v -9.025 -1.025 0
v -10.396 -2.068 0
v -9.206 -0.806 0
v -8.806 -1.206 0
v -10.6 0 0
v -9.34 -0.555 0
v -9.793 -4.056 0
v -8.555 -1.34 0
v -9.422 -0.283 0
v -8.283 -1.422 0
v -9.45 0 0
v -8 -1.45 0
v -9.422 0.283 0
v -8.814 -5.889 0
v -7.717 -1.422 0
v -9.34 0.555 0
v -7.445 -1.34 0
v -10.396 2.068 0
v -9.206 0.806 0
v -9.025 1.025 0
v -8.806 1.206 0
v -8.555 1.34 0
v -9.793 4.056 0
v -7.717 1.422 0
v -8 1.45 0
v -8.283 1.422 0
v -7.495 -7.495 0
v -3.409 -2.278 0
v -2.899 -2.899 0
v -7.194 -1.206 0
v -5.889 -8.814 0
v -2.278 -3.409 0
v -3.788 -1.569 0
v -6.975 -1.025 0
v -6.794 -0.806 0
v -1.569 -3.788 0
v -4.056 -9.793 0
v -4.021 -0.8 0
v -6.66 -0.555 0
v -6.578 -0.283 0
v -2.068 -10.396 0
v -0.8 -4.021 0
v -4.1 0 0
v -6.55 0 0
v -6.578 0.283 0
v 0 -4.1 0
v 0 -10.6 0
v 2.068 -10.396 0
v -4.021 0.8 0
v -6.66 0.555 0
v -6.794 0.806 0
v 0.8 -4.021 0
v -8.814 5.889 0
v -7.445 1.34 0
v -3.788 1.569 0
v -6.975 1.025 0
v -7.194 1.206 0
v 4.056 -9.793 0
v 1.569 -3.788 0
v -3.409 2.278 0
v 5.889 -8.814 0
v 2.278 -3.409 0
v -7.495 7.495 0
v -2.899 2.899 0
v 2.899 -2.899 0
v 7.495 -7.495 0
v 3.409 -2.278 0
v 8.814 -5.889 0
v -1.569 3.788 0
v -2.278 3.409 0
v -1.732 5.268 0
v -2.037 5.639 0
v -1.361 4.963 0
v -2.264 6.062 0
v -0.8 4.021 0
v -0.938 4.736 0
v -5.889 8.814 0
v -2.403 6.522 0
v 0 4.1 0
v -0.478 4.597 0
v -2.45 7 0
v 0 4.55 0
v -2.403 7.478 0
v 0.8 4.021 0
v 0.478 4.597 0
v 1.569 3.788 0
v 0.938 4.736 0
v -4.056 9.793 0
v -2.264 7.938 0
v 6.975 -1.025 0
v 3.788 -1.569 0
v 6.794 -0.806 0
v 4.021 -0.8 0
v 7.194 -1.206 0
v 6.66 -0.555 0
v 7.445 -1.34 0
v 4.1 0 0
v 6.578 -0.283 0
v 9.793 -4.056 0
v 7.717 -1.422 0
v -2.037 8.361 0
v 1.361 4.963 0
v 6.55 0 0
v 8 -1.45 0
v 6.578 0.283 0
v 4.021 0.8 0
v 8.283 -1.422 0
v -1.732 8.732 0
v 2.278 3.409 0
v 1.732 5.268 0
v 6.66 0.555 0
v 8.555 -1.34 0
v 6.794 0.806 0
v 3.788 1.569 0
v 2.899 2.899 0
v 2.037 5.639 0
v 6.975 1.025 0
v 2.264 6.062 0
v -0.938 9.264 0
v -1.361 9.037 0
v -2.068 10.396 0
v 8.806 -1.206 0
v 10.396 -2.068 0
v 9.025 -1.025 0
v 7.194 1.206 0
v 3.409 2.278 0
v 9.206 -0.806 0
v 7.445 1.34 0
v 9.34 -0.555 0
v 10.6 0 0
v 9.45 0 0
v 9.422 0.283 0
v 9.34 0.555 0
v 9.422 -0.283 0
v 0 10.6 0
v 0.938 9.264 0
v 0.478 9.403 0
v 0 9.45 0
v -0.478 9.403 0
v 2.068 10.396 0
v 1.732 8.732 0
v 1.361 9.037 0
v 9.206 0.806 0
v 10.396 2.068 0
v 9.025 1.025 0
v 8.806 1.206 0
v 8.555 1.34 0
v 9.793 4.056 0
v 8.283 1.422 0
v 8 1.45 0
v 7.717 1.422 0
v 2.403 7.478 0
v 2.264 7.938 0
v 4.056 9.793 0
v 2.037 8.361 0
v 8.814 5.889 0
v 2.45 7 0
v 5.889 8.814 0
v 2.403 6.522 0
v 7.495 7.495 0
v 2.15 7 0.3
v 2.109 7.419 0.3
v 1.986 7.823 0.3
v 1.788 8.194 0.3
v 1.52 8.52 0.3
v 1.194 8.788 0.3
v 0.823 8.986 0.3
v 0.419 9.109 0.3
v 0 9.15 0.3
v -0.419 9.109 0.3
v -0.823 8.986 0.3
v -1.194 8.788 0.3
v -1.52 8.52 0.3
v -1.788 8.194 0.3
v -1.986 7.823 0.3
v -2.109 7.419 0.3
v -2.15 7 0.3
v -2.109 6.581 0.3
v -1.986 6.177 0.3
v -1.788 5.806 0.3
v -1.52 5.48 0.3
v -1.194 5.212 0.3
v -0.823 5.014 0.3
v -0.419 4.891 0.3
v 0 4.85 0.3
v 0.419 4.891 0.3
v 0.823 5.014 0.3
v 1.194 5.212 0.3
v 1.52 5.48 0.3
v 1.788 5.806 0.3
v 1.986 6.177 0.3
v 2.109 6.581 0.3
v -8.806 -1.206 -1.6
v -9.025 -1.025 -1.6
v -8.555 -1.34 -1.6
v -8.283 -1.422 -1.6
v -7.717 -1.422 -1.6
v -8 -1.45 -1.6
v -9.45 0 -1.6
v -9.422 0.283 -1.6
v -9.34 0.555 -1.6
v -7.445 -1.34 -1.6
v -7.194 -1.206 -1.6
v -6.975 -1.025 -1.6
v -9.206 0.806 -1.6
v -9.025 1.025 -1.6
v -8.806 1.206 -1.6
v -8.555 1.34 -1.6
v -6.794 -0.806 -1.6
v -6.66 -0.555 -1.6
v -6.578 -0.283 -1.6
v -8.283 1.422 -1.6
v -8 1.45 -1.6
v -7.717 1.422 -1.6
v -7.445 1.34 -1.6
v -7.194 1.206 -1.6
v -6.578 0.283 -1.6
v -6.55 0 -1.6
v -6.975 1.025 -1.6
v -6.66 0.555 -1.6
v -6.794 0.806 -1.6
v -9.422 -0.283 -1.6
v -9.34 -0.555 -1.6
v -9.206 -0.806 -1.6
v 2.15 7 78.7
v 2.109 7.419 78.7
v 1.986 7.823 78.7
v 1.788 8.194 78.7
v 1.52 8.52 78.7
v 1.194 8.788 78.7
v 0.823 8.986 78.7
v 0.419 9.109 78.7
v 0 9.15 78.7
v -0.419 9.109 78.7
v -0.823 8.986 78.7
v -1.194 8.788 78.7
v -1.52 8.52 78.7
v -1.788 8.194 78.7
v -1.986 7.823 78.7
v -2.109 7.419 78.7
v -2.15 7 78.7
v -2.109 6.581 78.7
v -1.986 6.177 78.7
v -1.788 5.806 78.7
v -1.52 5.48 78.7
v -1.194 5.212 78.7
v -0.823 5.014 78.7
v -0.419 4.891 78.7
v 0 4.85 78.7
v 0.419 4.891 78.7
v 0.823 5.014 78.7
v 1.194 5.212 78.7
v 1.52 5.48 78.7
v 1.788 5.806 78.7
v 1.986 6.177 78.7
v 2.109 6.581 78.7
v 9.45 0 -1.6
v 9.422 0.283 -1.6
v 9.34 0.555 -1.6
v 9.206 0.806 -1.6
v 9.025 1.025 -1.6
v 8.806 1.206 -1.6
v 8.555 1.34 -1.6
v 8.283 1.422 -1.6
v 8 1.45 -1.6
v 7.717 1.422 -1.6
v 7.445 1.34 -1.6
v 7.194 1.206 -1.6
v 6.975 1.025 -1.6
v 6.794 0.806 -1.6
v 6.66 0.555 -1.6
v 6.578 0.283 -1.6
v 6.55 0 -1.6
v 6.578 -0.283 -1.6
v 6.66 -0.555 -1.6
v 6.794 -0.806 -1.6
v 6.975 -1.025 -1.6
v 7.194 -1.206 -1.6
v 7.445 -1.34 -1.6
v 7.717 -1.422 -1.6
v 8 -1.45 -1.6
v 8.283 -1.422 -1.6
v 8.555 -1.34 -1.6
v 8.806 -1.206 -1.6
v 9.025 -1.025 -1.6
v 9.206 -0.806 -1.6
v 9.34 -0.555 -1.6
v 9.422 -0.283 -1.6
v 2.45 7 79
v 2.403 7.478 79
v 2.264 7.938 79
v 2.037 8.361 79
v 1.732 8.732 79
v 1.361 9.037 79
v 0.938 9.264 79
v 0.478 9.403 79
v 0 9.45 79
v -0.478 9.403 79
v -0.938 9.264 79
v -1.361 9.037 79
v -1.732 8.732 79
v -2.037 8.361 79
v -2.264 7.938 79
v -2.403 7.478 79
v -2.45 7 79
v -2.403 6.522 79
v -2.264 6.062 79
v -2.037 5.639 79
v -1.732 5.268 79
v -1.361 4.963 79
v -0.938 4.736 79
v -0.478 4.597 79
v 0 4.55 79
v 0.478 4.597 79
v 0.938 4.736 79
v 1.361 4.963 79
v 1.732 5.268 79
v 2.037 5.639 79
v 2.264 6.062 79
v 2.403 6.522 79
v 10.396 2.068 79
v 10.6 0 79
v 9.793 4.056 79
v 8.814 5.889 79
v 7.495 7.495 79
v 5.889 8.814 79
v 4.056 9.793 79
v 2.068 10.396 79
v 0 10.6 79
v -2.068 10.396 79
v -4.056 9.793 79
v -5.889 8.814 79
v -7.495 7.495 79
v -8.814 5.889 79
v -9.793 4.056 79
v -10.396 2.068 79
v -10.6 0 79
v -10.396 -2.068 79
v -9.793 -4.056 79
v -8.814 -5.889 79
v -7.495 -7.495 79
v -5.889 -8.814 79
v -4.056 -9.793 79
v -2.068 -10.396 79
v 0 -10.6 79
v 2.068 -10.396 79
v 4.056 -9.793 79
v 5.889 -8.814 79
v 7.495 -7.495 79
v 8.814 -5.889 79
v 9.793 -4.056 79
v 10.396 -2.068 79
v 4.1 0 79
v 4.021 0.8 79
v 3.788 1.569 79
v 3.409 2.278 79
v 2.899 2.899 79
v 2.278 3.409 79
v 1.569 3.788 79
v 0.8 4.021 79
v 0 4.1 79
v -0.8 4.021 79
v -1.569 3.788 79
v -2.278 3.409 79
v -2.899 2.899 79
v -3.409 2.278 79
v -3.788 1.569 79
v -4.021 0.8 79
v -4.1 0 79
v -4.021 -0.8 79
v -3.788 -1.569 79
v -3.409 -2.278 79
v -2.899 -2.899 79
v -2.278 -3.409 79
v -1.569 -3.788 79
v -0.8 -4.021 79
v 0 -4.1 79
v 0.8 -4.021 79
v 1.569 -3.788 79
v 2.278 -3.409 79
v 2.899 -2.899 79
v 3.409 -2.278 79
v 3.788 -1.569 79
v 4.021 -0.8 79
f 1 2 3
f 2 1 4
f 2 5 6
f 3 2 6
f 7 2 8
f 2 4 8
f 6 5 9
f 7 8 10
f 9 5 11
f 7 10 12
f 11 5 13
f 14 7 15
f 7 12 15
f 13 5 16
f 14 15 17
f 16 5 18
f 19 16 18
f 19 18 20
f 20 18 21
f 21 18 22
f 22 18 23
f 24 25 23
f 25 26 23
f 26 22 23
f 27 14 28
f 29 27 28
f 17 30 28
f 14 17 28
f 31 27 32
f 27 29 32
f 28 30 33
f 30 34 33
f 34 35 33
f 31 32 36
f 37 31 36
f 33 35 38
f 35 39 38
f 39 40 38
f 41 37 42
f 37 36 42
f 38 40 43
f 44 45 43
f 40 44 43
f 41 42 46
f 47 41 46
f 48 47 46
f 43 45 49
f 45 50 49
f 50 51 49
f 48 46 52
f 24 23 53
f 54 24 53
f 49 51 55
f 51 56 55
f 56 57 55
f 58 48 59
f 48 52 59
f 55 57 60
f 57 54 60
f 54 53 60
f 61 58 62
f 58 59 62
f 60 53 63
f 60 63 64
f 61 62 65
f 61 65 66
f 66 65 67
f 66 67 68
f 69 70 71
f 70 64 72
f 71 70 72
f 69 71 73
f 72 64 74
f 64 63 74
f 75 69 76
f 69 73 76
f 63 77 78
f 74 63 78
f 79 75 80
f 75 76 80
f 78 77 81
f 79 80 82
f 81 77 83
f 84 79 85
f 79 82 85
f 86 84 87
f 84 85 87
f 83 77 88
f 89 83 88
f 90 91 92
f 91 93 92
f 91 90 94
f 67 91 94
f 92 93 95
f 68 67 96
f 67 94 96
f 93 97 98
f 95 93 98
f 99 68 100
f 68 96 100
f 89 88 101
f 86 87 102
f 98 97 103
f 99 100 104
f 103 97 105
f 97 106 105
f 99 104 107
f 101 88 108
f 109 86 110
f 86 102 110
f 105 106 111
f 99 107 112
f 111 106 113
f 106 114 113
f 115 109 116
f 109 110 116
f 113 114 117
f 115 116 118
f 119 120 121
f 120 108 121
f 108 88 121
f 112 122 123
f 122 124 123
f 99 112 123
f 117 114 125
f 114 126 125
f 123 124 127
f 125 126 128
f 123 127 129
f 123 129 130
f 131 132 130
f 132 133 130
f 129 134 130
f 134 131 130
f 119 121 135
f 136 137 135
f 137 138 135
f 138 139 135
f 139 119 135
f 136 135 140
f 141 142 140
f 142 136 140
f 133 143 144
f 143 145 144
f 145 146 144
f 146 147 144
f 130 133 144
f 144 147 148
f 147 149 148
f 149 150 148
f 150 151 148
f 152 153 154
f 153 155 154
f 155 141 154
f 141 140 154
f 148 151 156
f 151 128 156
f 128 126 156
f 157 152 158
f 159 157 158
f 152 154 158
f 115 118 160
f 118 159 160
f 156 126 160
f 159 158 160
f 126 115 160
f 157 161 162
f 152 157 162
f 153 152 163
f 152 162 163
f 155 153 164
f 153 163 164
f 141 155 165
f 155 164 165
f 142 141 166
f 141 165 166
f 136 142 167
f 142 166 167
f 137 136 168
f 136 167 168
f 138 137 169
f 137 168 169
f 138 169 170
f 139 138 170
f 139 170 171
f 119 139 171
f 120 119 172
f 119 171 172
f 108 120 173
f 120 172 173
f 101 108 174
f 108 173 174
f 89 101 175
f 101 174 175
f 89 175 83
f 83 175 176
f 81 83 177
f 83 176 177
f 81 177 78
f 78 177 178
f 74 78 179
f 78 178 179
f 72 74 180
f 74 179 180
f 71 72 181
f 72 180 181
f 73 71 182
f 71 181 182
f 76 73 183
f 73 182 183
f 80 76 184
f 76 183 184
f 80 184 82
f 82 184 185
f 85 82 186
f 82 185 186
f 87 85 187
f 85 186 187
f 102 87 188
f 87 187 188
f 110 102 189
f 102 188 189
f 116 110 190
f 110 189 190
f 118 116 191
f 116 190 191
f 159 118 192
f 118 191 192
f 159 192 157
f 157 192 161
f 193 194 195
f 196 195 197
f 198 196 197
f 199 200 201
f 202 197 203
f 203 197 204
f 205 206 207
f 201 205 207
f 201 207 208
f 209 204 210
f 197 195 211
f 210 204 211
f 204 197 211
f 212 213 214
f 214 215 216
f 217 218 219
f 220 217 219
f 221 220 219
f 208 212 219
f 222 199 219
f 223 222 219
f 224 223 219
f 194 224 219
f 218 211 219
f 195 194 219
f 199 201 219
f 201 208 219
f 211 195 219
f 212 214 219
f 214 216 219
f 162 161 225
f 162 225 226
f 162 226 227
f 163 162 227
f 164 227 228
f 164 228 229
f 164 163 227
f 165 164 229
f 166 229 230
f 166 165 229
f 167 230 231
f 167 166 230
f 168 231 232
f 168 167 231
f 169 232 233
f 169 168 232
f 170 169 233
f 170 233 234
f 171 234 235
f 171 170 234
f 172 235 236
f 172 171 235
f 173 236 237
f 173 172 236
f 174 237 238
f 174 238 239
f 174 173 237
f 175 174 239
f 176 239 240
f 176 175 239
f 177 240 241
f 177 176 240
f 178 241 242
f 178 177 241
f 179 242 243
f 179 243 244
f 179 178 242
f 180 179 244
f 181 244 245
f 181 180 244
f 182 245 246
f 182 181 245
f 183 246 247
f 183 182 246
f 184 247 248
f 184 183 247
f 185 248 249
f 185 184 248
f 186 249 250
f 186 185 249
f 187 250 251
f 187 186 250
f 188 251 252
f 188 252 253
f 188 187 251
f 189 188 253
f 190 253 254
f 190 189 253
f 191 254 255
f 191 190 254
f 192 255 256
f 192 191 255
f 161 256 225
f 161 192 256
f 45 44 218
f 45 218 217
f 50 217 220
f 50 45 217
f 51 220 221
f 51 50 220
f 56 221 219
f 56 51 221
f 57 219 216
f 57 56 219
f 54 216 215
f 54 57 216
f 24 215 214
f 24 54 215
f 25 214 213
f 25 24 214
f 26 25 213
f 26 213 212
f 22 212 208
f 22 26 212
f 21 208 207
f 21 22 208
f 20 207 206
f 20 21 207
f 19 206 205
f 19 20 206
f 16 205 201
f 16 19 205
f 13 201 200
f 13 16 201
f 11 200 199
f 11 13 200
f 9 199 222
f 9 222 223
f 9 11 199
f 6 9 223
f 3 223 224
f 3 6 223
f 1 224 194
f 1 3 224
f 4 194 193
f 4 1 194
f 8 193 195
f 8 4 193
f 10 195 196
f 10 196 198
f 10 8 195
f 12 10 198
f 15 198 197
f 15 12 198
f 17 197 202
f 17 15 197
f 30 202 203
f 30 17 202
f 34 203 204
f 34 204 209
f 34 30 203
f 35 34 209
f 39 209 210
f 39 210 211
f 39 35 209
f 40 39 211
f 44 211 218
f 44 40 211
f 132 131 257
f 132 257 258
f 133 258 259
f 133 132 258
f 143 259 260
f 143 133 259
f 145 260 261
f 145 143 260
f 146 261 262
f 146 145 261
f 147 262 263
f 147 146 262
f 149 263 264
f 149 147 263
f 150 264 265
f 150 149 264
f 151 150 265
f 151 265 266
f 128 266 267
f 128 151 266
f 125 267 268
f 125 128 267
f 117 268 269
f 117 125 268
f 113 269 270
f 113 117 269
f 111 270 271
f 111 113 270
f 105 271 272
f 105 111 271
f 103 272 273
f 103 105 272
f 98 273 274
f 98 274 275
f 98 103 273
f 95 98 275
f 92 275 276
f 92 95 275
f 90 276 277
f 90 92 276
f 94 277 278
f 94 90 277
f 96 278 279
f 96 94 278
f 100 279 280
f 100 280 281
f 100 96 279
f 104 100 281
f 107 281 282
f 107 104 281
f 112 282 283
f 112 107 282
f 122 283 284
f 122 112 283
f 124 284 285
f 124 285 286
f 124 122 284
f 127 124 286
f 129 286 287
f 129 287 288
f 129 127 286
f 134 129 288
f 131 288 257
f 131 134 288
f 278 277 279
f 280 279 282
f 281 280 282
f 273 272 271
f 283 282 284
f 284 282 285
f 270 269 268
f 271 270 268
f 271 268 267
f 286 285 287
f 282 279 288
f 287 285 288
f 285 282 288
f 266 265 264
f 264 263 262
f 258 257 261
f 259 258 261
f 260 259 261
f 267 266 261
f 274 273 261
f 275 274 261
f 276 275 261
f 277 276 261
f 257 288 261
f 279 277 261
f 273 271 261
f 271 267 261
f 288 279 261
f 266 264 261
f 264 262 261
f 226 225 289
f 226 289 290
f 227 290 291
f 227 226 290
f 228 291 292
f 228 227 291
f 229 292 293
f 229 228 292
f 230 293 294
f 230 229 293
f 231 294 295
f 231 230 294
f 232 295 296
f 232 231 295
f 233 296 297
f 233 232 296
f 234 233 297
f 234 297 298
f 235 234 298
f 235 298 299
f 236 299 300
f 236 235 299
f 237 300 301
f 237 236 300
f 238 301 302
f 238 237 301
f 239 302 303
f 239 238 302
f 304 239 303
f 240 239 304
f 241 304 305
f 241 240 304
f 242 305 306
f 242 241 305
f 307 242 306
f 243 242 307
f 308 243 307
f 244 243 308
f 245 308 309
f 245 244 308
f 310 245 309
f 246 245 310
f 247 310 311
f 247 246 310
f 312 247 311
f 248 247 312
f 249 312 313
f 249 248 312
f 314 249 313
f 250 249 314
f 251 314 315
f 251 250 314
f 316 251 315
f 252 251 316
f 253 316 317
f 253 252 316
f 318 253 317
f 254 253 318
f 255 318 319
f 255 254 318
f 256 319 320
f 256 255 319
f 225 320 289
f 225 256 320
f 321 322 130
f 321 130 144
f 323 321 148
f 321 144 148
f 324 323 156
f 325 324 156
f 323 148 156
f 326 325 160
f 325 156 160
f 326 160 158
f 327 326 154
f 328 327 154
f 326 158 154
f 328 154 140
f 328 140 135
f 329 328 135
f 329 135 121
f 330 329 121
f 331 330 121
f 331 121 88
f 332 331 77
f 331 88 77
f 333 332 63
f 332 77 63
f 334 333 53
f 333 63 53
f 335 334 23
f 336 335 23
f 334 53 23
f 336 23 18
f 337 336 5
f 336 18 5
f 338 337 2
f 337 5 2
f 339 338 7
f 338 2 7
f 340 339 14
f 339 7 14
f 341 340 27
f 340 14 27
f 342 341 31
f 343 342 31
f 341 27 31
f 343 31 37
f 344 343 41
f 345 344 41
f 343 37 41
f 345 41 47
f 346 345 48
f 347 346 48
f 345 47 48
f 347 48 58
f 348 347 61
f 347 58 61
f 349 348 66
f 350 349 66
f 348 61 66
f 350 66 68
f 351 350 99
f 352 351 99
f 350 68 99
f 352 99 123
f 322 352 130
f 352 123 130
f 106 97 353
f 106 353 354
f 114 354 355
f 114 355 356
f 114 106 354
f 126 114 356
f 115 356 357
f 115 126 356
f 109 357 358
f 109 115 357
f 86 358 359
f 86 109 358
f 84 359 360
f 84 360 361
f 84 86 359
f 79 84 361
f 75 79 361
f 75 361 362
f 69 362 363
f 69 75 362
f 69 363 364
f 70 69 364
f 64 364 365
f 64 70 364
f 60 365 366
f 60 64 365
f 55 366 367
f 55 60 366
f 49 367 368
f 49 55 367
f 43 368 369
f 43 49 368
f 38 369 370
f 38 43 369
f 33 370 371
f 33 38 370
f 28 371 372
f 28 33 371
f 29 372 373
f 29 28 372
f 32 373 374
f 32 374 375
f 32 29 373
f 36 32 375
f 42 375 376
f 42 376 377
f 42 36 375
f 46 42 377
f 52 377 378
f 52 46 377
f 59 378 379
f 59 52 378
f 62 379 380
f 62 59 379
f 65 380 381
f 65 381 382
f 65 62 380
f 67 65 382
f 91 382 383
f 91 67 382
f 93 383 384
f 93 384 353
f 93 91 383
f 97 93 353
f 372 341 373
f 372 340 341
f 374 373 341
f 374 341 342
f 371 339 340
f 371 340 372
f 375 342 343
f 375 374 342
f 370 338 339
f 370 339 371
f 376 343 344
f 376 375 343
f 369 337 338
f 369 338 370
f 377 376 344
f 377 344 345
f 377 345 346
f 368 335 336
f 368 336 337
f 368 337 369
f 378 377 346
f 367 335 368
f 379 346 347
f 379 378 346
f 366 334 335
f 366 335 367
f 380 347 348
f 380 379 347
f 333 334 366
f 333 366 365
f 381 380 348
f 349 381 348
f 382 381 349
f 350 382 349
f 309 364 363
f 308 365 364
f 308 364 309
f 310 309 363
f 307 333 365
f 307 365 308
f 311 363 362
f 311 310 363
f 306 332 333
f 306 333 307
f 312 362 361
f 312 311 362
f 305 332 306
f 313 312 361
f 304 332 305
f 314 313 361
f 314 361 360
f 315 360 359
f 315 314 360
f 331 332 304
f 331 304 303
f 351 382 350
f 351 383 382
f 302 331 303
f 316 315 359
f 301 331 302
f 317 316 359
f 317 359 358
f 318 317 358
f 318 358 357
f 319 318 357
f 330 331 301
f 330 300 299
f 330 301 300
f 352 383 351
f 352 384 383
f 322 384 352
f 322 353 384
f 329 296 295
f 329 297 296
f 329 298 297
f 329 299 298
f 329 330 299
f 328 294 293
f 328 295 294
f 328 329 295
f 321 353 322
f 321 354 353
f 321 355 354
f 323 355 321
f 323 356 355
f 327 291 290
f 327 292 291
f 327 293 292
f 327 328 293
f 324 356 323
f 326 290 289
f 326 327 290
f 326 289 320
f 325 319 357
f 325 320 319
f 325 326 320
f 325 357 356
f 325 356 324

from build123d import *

# Parameters (mm, degrees)
SKETCH_1_R      = 10.6
SKETCH_1_R_2    = 2.15
SKETCH_1_R_3    = 4.1
EXTRUDE_1_DEPTH = 79
SKETCH_2_R      = 1.45
EXTRUDE_2_DEPTH = 1.6
CHAMFER_1_SIZE  = 0.3


with BuildPart() as part:
    # 草图1 → 凸台-拉伸1 (new body)
    with BuildSketch(Plane.XY):
        Circle(SKETCH_1_R)
        with Locations((0, 7)):
            Circle(SKETCH_1_R_2, mode=Mode.SUBTRACT)
        Circle(SKETCH_1_R_3, mode=Mode.SUBTRACT)
    extrude(amount=EXTRUDE_1_DEPTH)

    # 草图2 → 凸台-拉伸2 (add)
    with BuildSketch(Plane.XY):
        with Locations((-8, 0)):
            Circle(SKETCH_2_R)
        with Locations((8, 0)):
            Circle(SKETCH_2_R)
    extrude(amount=-EXTRUDE_2_DEPTH)

    # 倒角1
    chamfer_1_edges = [part.edges().sort_by_distance(p)[0] for p in [
        (-2.15, 7, 0),
        (-2.15, 7, 79),
    ]]
    chamfer(chamfer_1_edges, length=CHAMFER_1_SIZE)


solid = part.part
